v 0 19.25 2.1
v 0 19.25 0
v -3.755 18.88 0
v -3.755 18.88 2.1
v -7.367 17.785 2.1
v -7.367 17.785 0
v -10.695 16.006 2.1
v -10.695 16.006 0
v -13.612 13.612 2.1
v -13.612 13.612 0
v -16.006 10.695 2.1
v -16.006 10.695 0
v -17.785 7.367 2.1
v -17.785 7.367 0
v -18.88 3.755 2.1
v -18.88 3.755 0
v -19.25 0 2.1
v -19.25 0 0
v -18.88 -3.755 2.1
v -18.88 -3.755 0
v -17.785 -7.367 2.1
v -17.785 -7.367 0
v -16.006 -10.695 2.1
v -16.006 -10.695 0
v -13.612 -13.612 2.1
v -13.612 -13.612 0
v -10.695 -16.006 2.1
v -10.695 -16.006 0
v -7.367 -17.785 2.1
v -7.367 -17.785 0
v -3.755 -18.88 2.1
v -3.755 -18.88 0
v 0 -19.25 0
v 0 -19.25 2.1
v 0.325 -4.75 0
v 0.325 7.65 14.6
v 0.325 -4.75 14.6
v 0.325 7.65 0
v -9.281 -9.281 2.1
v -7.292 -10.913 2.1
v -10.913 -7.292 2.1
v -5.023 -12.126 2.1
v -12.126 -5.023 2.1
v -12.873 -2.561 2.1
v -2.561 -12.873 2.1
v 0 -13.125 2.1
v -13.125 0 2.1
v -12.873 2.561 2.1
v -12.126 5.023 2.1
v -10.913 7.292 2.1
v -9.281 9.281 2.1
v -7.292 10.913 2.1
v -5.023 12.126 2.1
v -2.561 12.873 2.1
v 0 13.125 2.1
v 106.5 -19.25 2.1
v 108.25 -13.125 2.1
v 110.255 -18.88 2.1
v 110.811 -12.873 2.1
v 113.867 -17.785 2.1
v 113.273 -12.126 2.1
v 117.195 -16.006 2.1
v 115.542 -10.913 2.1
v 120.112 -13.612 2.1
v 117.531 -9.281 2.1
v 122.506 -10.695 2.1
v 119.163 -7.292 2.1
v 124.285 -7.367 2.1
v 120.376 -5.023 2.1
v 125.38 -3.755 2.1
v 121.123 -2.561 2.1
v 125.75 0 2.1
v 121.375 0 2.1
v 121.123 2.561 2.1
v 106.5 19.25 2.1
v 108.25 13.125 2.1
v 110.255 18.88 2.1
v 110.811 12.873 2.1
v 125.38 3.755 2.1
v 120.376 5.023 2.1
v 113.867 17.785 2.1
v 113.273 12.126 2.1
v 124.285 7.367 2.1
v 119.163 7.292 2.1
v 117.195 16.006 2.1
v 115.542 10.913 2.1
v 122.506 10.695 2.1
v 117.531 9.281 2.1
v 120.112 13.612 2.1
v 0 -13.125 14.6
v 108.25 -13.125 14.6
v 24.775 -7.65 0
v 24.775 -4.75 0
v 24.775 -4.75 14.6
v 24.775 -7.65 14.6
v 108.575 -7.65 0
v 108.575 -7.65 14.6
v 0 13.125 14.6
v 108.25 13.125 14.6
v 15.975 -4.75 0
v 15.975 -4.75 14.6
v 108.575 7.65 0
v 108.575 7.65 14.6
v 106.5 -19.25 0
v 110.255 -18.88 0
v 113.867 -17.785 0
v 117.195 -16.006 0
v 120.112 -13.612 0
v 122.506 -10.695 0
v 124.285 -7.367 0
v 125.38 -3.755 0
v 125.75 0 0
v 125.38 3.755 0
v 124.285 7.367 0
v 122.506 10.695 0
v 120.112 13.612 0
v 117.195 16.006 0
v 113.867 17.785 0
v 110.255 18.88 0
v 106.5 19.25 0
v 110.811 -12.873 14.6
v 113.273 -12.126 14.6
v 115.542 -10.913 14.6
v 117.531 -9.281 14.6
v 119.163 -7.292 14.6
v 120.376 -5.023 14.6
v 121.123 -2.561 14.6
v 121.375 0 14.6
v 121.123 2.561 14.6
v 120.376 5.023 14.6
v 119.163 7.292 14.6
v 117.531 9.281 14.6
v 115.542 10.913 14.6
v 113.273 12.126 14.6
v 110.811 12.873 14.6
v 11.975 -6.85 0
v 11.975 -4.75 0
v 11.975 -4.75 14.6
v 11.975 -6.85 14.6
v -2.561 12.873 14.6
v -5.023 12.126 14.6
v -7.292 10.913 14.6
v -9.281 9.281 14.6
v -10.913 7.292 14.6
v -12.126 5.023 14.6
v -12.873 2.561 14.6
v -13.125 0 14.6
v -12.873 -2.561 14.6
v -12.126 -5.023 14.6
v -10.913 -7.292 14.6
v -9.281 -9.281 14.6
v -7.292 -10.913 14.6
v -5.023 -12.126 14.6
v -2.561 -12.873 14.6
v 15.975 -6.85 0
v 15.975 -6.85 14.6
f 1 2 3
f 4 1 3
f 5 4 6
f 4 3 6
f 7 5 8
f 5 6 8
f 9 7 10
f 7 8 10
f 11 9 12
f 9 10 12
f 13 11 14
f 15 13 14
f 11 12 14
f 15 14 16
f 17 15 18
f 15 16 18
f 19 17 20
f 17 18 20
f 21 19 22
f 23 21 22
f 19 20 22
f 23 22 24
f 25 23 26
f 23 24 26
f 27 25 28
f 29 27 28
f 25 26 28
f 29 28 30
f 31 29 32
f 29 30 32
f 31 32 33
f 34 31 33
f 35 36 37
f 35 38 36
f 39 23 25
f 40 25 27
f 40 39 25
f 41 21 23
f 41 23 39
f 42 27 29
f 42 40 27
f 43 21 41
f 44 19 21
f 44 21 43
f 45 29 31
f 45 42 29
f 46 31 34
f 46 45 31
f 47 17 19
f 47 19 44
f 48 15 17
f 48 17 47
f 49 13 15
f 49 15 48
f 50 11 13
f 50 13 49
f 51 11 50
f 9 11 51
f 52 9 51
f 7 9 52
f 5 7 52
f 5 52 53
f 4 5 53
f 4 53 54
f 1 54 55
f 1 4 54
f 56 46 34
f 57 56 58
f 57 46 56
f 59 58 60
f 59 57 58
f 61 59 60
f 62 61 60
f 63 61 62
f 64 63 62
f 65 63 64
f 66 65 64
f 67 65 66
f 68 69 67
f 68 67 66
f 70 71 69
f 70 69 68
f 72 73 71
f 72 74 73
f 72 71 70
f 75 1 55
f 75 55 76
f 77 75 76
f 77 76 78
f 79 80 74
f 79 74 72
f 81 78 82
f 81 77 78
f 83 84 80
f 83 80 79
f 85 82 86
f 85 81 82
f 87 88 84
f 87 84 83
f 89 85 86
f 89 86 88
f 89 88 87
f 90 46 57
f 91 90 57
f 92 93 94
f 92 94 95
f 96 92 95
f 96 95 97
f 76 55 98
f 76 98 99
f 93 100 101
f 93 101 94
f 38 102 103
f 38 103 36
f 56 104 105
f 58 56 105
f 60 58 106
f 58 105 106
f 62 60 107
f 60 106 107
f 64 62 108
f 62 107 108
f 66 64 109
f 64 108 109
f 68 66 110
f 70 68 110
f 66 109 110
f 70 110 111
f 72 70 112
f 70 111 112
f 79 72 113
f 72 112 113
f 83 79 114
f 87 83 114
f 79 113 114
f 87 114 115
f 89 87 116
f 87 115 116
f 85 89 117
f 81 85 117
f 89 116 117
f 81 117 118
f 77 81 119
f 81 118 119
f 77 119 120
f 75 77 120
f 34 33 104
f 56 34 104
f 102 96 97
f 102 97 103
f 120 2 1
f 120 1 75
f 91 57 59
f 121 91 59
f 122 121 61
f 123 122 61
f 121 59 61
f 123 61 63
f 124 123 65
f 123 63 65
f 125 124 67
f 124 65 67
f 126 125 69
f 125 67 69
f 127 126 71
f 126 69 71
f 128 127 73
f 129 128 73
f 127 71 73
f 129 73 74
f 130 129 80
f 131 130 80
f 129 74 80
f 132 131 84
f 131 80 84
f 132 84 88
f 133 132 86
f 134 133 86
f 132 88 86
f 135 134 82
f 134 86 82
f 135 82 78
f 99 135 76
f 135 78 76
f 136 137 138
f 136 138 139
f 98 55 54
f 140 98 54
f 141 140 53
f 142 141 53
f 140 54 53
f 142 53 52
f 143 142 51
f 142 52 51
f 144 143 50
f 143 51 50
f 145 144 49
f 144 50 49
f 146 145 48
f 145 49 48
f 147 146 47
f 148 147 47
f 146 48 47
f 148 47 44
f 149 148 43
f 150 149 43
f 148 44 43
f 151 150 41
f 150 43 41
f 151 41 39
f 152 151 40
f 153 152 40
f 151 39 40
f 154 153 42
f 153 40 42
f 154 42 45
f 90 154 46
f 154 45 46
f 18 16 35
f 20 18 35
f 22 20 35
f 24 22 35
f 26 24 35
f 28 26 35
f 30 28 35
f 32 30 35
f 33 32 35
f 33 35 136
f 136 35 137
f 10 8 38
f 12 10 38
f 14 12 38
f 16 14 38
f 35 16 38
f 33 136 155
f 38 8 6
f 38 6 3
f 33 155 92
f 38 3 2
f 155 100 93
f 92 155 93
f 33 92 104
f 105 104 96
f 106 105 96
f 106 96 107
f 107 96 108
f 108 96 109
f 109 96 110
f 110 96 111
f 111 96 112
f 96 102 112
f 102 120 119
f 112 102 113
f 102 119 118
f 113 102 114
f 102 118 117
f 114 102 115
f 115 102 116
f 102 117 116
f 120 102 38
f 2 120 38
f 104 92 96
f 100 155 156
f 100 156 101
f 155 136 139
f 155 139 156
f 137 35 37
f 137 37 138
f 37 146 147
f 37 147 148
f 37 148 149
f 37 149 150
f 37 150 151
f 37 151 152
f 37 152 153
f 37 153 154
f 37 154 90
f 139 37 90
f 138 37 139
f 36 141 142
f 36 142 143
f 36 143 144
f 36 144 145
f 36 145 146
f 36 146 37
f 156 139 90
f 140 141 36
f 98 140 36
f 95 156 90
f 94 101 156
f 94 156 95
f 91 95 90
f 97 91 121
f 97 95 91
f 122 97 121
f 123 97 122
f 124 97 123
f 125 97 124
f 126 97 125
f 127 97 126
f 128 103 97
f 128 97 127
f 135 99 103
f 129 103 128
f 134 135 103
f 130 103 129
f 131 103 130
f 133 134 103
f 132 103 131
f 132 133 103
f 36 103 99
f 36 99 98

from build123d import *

# Parameters (mm, degrees)
PAD_DEPTH    = 2.1
POCKET_DEPTH = 5
PAD001_DEPTH = 12.5


with BuildPart() as part:
    # Sketch → Pad (new body)
    with BuildSketch(Plane.XY):
        with BuildLine():
            ThreePointArc((0, 19.25), (-19.25, 0), (0, -19.25))
            Line((0, -19.25), (106.5, -19.25))
            ThreePointArc((106.5, -19.25), (125.75, 0), (106.5, 19.25))
            Line((0, 19.25), (106.5, 19.25))
        make_face()
    extrude(amount=PAD_DEPTH)

    # Sketch001 (on Face6 of Pad) → Pocket (cut)
    with BuildSketch(Plane.XY.offset(2.1)):
        Polygon((0.325, 7.65), (108.575, 7.65), (108.575, -7.65), (24.775, -7.65), (24.775, -4.75), (15.975, -4.75), (15.975, -6.85), (11.975, -6.85), (11.975, -4.75), (0.325, -4.75), align=None)
    extrude(amount=-POCKET_DEPTH, mode=Mode.SUBTRACT)

    # Sketch002 (on Face5 of Pocket) → Pad001 (join)
    with BuildSketch(Plane.XY.offset(2.1)):
        with BuildLine():
            ThreePointArc((0, 13.125), (-13.125, 0), (0, -13.125))
            Line((0, -13.125), (108.25, -13.125))
            ThreePointArc((108.25, -13.125), (121.375, 0), (108.25, 13.125))
            Line((0, 13.125), (108.25, 13.125))
        make_face()
        Polygon((0.325, 7.65), (0.325, -4.75), (11.975, -4.75), (11.975, -6.85), (15.975, -6.85), (15.975, -4.75), (24.775, -4.75), (24.775, -7.65), (108.575, -7.65), (108.575, 7.65), align=None, mode=Mode.SUBTRACT)
    extrude(amount=PAD001_DEPTH)


solid = part.part
